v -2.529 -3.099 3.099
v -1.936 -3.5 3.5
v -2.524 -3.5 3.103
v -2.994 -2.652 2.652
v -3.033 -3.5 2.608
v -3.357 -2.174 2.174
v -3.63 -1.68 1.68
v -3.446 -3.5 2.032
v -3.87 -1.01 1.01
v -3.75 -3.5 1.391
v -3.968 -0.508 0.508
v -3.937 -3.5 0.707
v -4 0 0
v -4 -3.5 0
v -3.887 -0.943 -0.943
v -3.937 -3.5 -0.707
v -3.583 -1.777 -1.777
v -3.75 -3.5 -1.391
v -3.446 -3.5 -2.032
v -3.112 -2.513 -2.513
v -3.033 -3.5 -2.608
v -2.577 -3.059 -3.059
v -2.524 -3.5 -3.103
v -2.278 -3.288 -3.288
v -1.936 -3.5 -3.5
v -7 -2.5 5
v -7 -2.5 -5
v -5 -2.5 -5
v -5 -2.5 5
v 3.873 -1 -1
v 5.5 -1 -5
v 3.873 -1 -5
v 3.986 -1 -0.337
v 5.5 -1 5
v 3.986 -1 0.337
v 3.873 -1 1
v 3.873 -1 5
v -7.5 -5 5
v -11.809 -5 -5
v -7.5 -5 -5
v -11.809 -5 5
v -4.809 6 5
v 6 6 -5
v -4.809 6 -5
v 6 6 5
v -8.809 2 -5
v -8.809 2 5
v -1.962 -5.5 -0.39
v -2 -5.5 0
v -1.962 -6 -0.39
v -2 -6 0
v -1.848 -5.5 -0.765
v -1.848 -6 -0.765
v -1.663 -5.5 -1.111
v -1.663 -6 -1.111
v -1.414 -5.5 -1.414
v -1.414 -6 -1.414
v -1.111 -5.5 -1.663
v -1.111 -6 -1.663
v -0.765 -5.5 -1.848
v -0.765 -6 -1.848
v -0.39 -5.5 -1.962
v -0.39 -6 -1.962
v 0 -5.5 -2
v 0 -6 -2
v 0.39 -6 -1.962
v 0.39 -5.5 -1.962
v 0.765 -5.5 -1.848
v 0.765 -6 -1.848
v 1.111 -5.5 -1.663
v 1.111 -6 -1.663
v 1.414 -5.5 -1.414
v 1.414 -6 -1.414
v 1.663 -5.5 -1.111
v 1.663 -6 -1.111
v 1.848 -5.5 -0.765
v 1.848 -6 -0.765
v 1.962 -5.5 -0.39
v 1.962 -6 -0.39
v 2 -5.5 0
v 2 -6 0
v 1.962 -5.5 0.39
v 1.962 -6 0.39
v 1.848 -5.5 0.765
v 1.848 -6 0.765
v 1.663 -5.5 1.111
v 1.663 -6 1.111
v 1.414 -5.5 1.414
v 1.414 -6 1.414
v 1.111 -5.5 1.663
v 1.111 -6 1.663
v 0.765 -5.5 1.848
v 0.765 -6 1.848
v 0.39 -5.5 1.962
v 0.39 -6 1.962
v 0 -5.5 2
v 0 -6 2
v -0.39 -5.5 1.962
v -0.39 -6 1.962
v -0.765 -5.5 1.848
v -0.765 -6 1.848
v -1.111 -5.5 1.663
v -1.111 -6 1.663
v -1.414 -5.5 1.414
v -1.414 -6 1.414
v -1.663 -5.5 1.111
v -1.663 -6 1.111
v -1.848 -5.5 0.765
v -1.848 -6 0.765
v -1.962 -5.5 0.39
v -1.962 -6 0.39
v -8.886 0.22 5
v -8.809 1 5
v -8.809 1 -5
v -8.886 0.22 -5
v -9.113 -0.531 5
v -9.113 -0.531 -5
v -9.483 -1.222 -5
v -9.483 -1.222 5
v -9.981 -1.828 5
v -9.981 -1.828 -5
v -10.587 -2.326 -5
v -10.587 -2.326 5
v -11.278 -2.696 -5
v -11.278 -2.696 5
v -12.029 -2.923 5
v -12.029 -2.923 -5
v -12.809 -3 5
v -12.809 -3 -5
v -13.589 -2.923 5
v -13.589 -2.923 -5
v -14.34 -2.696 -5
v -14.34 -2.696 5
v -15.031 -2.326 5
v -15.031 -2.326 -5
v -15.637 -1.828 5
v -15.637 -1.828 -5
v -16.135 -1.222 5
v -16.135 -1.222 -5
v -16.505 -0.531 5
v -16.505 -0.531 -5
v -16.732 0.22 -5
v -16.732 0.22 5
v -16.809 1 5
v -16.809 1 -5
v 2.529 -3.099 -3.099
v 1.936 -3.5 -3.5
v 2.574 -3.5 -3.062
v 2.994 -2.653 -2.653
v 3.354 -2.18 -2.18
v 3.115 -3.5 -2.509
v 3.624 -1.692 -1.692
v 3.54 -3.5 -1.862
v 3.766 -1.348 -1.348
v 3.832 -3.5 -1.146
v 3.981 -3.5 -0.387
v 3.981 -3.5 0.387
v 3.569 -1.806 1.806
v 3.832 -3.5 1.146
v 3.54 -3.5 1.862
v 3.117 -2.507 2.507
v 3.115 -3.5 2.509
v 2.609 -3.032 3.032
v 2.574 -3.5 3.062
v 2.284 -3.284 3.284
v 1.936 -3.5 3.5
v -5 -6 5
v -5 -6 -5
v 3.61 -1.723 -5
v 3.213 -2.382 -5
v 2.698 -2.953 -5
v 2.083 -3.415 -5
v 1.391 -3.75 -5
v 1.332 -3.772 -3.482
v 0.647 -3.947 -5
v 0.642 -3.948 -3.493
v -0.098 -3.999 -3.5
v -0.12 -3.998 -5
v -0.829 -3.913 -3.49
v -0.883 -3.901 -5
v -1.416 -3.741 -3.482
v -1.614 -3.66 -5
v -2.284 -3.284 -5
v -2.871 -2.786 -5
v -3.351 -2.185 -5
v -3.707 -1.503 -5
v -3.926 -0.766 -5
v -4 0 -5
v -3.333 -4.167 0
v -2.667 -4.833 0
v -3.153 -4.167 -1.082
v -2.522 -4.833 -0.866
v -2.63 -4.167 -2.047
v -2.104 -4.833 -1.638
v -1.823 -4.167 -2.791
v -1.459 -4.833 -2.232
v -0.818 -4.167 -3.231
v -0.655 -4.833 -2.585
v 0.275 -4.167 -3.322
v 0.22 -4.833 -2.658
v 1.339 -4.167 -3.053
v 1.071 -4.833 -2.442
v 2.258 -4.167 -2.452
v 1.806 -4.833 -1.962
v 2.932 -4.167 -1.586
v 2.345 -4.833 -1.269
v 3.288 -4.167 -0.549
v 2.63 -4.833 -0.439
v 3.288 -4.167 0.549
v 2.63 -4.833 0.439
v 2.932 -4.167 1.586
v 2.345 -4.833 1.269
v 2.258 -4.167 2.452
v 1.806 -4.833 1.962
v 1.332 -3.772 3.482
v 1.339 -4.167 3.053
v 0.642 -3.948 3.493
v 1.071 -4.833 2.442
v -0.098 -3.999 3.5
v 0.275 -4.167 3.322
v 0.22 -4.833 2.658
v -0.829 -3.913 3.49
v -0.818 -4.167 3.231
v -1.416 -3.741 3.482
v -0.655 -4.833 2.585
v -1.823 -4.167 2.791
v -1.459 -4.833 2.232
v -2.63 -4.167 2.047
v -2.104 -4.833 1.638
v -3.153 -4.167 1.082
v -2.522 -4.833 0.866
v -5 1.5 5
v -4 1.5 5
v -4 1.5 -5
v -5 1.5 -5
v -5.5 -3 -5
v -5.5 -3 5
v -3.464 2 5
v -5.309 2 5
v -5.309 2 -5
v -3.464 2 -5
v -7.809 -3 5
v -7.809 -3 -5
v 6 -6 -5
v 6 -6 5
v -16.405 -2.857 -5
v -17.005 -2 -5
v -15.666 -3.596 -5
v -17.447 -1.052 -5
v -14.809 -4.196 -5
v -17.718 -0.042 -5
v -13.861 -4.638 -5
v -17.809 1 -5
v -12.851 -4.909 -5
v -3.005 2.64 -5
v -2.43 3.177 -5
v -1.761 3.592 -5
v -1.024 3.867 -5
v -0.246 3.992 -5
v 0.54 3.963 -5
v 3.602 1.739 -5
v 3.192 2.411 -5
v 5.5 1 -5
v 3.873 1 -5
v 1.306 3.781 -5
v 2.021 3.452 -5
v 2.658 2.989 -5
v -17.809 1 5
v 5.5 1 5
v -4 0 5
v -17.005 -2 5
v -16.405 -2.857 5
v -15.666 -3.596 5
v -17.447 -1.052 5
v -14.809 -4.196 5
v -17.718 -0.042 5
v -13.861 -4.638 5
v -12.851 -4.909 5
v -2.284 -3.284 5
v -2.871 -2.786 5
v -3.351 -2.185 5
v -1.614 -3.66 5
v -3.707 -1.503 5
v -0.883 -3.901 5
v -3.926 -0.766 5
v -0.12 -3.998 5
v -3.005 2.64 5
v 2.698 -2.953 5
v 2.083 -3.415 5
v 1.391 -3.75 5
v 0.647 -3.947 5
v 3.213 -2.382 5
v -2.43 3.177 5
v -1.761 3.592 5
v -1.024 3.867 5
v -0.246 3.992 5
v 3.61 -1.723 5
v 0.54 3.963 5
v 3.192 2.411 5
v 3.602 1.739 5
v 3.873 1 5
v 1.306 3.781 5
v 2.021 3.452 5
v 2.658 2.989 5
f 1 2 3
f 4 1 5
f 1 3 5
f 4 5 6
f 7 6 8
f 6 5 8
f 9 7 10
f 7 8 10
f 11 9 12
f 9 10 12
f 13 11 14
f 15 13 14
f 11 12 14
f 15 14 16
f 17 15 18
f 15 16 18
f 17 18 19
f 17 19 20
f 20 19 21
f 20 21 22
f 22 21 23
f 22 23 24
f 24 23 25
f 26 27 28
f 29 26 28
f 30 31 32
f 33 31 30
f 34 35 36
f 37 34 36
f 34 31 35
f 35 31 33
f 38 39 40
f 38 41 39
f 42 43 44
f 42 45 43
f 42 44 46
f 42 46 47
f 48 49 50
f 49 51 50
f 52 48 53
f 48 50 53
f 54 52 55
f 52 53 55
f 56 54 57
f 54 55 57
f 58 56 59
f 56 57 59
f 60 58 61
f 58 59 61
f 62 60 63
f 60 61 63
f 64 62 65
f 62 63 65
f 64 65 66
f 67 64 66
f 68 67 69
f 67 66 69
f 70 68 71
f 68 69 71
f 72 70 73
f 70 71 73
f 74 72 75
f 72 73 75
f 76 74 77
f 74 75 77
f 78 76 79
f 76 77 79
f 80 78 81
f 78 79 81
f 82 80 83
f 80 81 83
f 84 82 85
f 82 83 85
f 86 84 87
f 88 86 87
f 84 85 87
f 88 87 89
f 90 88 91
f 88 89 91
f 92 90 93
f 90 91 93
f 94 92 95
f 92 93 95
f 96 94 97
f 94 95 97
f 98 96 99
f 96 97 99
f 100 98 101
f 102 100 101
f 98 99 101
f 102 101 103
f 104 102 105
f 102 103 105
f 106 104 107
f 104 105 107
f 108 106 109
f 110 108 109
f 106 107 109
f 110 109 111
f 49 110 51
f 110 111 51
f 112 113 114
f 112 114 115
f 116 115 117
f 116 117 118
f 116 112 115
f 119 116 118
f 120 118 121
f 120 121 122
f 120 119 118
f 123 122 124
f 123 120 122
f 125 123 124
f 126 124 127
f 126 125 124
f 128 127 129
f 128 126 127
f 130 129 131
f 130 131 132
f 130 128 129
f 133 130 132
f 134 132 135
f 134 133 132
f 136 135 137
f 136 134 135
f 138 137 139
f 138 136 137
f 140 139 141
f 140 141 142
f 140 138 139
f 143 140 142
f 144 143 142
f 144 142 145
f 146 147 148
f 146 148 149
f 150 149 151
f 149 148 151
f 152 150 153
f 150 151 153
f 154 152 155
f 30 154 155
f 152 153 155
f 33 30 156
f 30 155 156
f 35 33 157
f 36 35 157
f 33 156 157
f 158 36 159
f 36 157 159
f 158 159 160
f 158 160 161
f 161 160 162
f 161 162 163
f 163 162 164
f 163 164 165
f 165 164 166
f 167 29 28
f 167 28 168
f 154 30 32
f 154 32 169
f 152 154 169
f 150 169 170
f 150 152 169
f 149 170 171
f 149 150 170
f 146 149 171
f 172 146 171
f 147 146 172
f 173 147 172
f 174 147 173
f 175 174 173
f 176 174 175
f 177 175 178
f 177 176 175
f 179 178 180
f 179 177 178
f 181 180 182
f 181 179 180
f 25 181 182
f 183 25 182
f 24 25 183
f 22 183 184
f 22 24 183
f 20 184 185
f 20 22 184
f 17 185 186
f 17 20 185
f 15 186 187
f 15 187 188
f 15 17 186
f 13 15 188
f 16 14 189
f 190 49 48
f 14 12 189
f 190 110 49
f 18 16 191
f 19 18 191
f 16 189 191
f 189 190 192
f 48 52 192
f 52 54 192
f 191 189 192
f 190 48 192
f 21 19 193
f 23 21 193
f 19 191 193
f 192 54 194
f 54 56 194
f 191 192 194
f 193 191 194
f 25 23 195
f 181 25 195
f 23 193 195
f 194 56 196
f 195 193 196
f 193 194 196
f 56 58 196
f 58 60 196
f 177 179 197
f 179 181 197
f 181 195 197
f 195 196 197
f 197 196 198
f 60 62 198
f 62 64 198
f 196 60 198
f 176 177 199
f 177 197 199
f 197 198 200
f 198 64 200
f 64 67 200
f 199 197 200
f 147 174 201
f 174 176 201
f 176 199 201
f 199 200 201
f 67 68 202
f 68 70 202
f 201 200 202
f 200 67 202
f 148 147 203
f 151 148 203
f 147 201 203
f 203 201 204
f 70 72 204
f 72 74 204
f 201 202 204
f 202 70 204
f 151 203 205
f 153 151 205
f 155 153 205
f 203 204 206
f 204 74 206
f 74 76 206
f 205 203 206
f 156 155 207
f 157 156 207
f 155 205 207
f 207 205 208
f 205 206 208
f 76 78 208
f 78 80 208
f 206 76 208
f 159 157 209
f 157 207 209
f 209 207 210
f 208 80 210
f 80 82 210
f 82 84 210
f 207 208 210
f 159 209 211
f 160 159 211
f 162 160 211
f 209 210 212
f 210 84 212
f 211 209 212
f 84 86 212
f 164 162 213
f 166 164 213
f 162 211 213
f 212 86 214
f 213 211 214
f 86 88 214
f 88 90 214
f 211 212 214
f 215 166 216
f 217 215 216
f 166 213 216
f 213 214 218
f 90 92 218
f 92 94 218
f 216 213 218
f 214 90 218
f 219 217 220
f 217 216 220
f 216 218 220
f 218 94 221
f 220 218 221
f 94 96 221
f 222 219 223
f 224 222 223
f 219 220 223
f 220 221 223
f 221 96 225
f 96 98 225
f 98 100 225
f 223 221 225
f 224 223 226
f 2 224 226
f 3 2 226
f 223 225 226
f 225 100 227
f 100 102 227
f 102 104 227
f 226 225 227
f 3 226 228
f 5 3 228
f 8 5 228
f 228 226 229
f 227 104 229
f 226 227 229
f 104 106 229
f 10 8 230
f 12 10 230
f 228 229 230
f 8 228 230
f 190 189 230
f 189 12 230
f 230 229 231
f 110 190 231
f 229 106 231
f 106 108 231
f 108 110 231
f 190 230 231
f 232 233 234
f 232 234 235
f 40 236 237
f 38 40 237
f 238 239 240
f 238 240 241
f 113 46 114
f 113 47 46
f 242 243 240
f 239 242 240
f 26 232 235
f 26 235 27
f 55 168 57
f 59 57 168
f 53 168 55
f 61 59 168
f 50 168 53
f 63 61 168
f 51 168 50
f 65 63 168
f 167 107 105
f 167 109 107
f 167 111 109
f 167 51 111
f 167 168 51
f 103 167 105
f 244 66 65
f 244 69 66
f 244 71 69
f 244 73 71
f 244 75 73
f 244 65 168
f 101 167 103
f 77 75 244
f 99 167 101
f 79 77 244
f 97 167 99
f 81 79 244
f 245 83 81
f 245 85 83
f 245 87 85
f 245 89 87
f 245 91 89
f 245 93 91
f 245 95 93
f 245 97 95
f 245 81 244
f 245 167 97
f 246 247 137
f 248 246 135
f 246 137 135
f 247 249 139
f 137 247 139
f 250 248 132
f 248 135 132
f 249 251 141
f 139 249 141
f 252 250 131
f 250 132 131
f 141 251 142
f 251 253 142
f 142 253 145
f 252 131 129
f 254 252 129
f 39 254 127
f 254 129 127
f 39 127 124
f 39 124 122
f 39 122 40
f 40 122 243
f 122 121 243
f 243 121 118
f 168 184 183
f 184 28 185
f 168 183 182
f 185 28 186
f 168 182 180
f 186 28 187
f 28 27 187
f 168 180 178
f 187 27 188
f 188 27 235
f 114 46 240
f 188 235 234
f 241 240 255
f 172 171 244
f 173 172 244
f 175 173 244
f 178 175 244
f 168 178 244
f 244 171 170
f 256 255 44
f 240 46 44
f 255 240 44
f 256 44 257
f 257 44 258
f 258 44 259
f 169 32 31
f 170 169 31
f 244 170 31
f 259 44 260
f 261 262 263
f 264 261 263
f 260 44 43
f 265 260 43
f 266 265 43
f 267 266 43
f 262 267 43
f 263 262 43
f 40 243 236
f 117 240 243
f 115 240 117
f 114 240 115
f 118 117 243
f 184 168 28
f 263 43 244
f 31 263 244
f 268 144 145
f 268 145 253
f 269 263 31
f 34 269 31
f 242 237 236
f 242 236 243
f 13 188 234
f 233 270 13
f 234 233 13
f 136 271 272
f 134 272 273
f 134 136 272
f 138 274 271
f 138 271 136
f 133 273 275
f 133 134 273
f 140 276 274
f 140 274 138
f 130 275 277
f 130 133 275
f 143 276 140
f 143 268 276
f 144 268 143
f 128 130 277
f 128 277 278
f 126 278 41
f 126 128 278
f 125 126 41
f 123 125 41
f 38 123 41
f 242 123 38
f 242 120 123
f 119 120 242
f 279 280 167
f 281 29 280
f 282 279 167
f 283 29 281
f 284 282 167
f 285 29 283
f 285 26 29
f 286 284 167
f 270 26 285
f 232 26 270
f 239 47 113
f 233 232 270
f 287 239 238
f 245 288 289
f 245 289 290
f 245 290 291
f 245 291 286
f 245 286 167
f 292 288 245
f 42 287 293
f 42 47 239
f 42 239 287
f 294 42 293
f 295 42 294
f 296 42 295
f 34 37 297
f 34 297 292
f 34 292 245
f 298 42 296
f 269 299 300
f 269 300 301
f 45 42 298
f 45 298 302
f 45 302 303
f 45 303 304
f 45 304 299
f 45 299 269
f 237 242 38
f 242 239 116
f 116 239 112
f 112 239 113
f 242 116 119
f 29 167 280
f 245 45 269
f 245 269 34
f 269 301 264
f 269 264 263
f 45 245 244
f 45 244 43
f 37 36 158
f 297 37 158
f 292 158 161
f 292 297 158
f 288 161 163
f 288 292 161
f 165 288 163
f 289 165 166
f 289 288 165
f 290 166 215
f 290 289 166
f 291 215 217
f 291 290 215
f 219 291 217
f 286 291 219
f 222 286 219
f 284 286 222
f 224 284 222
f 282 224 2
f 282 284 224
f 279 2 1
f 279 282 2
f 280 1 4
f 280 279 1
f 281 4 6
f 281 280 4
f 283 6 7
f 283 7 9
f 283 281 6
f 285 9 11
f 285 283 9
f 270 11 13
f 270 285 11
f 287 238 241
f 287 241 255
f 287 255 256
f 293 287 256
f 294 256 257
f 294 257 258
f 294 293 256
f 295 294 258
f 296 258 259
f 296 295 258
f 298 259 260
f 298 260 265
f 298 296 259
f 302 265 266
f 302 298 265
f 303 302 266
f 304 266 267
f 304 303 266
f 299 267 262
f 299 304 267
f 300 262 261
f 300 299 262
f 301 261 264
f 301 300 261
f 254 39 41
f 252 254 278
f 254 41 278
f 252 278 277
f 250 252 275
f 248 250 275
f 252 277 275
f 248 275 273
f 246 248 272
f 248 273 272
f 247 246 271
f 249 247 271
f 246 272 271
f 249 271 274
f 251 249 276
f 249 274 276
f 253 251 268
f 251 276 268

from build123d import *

# Parameters (mm, degrees)
F1_DEPTH = 5
F4_SIZE  = 1.99999
F5_R     = 5.99999
F6_SIZE  = 4


# Not quite as in the source:
# - a fillet or chamfer is up to 0.001 mm smaller than in the source, because OpenCascade refuses the exact size


with BuildPart() as f1:
    # F0 (on Top) → F1 (new body, symmetric)
    with BuildSketch(Plane.XY):
        with BuildLine():
            ThreePointArc((3.8729833462, -1), (-0.5040171699, -3.9681187851), (-4, 0))
            Line((-4, 0), (-4, 1.5))
            Line((-4, 1.5), (-5, 1.5))
            Line((-5, 1.5), (-7, -2.5))
            Line((-7, -2.5), (-5, -2.5))
            Line((-5, -2.5), (-5, -6))
            Line((-5, -6), (6, -6))
            Line((6, -6), (6, 6))
            Line((6, 6), (-8.8090169944, 6))
            Line((-8.8090169944, 6), (-8.8090169944, 1))
            ThreePointArc((-8.8090169944, 1), (-12.8090169944, -3), (-16.8090169944, 1))
            Line((-16.8090169944, 1), (-17.8090169944, 1))
            Line((-17.8090169944, 1), (-17.8090169944, -5))
            Line((-17.8090169944, -5), (-8.8090169944, -5))
            Line((-8.8090169944, -5), (-5.5, -5))
            Line((-5.5, -5), (-5.5, -3))
            Line((-5.5, -3), (-7.8090169944, -3))
            Line((-7.8090169944, -3), (-5.3090169944, 2))
            Line((-5.3090169944, 2), (-3.4641016151, 2))
            ThreePointArc((-3.4641016151, 2), (0.5401815135, 3.9633576589), (3.8729833462, 1))
            Line((3.8729833462, 1), (5.5, 1))
            Line((5.5, 1), (5.5, -1))
            Line((5.5, -1), (3.8729833462, -1))
        make_face()
    extrude(amount=F1_DEPTH, both=True)

    # F2 (on Top) → F3 (revolve, cut)
    with BuildSketch(Plane.XY):
        Polygon((0, 0), (-4, 0), (-4, -3.5), (-2, -5.5), (-2, -6), (0, -6), align=None)
    revolve(axis=Axis((0, -2.25, 0), (0, -1, 0)), mode=Mode.SUBTRACT)

    # F4 (size 2 in the source; OpenCascade refuses exactly that, so slightly less here)
    f4_edges = [f1.edges().sort_by_distance(p)[0] for p in [
        (-5.5, -5, 0),
    ]]
    chamfer(f4_edges, length=F4_SIZE)

    # F5 (radius 6 in the source; OpenCascade refuses exactly that, so slightly less here)
    f5_edges = [f1.edges().sort_by_distance(p)[0] for p in [
        (-17.809017, -5, 0),
    ]]
    fillet(f5_edges, radius=F5_R)

    # F6
    f6_edges = [f1.edges().sort_by_distance(p)[0] for p in [
        (-8.809017, 6, 0),
    ]]
    chamfer(f6_edges, length=F6_SIZE)


solid = f1.part
